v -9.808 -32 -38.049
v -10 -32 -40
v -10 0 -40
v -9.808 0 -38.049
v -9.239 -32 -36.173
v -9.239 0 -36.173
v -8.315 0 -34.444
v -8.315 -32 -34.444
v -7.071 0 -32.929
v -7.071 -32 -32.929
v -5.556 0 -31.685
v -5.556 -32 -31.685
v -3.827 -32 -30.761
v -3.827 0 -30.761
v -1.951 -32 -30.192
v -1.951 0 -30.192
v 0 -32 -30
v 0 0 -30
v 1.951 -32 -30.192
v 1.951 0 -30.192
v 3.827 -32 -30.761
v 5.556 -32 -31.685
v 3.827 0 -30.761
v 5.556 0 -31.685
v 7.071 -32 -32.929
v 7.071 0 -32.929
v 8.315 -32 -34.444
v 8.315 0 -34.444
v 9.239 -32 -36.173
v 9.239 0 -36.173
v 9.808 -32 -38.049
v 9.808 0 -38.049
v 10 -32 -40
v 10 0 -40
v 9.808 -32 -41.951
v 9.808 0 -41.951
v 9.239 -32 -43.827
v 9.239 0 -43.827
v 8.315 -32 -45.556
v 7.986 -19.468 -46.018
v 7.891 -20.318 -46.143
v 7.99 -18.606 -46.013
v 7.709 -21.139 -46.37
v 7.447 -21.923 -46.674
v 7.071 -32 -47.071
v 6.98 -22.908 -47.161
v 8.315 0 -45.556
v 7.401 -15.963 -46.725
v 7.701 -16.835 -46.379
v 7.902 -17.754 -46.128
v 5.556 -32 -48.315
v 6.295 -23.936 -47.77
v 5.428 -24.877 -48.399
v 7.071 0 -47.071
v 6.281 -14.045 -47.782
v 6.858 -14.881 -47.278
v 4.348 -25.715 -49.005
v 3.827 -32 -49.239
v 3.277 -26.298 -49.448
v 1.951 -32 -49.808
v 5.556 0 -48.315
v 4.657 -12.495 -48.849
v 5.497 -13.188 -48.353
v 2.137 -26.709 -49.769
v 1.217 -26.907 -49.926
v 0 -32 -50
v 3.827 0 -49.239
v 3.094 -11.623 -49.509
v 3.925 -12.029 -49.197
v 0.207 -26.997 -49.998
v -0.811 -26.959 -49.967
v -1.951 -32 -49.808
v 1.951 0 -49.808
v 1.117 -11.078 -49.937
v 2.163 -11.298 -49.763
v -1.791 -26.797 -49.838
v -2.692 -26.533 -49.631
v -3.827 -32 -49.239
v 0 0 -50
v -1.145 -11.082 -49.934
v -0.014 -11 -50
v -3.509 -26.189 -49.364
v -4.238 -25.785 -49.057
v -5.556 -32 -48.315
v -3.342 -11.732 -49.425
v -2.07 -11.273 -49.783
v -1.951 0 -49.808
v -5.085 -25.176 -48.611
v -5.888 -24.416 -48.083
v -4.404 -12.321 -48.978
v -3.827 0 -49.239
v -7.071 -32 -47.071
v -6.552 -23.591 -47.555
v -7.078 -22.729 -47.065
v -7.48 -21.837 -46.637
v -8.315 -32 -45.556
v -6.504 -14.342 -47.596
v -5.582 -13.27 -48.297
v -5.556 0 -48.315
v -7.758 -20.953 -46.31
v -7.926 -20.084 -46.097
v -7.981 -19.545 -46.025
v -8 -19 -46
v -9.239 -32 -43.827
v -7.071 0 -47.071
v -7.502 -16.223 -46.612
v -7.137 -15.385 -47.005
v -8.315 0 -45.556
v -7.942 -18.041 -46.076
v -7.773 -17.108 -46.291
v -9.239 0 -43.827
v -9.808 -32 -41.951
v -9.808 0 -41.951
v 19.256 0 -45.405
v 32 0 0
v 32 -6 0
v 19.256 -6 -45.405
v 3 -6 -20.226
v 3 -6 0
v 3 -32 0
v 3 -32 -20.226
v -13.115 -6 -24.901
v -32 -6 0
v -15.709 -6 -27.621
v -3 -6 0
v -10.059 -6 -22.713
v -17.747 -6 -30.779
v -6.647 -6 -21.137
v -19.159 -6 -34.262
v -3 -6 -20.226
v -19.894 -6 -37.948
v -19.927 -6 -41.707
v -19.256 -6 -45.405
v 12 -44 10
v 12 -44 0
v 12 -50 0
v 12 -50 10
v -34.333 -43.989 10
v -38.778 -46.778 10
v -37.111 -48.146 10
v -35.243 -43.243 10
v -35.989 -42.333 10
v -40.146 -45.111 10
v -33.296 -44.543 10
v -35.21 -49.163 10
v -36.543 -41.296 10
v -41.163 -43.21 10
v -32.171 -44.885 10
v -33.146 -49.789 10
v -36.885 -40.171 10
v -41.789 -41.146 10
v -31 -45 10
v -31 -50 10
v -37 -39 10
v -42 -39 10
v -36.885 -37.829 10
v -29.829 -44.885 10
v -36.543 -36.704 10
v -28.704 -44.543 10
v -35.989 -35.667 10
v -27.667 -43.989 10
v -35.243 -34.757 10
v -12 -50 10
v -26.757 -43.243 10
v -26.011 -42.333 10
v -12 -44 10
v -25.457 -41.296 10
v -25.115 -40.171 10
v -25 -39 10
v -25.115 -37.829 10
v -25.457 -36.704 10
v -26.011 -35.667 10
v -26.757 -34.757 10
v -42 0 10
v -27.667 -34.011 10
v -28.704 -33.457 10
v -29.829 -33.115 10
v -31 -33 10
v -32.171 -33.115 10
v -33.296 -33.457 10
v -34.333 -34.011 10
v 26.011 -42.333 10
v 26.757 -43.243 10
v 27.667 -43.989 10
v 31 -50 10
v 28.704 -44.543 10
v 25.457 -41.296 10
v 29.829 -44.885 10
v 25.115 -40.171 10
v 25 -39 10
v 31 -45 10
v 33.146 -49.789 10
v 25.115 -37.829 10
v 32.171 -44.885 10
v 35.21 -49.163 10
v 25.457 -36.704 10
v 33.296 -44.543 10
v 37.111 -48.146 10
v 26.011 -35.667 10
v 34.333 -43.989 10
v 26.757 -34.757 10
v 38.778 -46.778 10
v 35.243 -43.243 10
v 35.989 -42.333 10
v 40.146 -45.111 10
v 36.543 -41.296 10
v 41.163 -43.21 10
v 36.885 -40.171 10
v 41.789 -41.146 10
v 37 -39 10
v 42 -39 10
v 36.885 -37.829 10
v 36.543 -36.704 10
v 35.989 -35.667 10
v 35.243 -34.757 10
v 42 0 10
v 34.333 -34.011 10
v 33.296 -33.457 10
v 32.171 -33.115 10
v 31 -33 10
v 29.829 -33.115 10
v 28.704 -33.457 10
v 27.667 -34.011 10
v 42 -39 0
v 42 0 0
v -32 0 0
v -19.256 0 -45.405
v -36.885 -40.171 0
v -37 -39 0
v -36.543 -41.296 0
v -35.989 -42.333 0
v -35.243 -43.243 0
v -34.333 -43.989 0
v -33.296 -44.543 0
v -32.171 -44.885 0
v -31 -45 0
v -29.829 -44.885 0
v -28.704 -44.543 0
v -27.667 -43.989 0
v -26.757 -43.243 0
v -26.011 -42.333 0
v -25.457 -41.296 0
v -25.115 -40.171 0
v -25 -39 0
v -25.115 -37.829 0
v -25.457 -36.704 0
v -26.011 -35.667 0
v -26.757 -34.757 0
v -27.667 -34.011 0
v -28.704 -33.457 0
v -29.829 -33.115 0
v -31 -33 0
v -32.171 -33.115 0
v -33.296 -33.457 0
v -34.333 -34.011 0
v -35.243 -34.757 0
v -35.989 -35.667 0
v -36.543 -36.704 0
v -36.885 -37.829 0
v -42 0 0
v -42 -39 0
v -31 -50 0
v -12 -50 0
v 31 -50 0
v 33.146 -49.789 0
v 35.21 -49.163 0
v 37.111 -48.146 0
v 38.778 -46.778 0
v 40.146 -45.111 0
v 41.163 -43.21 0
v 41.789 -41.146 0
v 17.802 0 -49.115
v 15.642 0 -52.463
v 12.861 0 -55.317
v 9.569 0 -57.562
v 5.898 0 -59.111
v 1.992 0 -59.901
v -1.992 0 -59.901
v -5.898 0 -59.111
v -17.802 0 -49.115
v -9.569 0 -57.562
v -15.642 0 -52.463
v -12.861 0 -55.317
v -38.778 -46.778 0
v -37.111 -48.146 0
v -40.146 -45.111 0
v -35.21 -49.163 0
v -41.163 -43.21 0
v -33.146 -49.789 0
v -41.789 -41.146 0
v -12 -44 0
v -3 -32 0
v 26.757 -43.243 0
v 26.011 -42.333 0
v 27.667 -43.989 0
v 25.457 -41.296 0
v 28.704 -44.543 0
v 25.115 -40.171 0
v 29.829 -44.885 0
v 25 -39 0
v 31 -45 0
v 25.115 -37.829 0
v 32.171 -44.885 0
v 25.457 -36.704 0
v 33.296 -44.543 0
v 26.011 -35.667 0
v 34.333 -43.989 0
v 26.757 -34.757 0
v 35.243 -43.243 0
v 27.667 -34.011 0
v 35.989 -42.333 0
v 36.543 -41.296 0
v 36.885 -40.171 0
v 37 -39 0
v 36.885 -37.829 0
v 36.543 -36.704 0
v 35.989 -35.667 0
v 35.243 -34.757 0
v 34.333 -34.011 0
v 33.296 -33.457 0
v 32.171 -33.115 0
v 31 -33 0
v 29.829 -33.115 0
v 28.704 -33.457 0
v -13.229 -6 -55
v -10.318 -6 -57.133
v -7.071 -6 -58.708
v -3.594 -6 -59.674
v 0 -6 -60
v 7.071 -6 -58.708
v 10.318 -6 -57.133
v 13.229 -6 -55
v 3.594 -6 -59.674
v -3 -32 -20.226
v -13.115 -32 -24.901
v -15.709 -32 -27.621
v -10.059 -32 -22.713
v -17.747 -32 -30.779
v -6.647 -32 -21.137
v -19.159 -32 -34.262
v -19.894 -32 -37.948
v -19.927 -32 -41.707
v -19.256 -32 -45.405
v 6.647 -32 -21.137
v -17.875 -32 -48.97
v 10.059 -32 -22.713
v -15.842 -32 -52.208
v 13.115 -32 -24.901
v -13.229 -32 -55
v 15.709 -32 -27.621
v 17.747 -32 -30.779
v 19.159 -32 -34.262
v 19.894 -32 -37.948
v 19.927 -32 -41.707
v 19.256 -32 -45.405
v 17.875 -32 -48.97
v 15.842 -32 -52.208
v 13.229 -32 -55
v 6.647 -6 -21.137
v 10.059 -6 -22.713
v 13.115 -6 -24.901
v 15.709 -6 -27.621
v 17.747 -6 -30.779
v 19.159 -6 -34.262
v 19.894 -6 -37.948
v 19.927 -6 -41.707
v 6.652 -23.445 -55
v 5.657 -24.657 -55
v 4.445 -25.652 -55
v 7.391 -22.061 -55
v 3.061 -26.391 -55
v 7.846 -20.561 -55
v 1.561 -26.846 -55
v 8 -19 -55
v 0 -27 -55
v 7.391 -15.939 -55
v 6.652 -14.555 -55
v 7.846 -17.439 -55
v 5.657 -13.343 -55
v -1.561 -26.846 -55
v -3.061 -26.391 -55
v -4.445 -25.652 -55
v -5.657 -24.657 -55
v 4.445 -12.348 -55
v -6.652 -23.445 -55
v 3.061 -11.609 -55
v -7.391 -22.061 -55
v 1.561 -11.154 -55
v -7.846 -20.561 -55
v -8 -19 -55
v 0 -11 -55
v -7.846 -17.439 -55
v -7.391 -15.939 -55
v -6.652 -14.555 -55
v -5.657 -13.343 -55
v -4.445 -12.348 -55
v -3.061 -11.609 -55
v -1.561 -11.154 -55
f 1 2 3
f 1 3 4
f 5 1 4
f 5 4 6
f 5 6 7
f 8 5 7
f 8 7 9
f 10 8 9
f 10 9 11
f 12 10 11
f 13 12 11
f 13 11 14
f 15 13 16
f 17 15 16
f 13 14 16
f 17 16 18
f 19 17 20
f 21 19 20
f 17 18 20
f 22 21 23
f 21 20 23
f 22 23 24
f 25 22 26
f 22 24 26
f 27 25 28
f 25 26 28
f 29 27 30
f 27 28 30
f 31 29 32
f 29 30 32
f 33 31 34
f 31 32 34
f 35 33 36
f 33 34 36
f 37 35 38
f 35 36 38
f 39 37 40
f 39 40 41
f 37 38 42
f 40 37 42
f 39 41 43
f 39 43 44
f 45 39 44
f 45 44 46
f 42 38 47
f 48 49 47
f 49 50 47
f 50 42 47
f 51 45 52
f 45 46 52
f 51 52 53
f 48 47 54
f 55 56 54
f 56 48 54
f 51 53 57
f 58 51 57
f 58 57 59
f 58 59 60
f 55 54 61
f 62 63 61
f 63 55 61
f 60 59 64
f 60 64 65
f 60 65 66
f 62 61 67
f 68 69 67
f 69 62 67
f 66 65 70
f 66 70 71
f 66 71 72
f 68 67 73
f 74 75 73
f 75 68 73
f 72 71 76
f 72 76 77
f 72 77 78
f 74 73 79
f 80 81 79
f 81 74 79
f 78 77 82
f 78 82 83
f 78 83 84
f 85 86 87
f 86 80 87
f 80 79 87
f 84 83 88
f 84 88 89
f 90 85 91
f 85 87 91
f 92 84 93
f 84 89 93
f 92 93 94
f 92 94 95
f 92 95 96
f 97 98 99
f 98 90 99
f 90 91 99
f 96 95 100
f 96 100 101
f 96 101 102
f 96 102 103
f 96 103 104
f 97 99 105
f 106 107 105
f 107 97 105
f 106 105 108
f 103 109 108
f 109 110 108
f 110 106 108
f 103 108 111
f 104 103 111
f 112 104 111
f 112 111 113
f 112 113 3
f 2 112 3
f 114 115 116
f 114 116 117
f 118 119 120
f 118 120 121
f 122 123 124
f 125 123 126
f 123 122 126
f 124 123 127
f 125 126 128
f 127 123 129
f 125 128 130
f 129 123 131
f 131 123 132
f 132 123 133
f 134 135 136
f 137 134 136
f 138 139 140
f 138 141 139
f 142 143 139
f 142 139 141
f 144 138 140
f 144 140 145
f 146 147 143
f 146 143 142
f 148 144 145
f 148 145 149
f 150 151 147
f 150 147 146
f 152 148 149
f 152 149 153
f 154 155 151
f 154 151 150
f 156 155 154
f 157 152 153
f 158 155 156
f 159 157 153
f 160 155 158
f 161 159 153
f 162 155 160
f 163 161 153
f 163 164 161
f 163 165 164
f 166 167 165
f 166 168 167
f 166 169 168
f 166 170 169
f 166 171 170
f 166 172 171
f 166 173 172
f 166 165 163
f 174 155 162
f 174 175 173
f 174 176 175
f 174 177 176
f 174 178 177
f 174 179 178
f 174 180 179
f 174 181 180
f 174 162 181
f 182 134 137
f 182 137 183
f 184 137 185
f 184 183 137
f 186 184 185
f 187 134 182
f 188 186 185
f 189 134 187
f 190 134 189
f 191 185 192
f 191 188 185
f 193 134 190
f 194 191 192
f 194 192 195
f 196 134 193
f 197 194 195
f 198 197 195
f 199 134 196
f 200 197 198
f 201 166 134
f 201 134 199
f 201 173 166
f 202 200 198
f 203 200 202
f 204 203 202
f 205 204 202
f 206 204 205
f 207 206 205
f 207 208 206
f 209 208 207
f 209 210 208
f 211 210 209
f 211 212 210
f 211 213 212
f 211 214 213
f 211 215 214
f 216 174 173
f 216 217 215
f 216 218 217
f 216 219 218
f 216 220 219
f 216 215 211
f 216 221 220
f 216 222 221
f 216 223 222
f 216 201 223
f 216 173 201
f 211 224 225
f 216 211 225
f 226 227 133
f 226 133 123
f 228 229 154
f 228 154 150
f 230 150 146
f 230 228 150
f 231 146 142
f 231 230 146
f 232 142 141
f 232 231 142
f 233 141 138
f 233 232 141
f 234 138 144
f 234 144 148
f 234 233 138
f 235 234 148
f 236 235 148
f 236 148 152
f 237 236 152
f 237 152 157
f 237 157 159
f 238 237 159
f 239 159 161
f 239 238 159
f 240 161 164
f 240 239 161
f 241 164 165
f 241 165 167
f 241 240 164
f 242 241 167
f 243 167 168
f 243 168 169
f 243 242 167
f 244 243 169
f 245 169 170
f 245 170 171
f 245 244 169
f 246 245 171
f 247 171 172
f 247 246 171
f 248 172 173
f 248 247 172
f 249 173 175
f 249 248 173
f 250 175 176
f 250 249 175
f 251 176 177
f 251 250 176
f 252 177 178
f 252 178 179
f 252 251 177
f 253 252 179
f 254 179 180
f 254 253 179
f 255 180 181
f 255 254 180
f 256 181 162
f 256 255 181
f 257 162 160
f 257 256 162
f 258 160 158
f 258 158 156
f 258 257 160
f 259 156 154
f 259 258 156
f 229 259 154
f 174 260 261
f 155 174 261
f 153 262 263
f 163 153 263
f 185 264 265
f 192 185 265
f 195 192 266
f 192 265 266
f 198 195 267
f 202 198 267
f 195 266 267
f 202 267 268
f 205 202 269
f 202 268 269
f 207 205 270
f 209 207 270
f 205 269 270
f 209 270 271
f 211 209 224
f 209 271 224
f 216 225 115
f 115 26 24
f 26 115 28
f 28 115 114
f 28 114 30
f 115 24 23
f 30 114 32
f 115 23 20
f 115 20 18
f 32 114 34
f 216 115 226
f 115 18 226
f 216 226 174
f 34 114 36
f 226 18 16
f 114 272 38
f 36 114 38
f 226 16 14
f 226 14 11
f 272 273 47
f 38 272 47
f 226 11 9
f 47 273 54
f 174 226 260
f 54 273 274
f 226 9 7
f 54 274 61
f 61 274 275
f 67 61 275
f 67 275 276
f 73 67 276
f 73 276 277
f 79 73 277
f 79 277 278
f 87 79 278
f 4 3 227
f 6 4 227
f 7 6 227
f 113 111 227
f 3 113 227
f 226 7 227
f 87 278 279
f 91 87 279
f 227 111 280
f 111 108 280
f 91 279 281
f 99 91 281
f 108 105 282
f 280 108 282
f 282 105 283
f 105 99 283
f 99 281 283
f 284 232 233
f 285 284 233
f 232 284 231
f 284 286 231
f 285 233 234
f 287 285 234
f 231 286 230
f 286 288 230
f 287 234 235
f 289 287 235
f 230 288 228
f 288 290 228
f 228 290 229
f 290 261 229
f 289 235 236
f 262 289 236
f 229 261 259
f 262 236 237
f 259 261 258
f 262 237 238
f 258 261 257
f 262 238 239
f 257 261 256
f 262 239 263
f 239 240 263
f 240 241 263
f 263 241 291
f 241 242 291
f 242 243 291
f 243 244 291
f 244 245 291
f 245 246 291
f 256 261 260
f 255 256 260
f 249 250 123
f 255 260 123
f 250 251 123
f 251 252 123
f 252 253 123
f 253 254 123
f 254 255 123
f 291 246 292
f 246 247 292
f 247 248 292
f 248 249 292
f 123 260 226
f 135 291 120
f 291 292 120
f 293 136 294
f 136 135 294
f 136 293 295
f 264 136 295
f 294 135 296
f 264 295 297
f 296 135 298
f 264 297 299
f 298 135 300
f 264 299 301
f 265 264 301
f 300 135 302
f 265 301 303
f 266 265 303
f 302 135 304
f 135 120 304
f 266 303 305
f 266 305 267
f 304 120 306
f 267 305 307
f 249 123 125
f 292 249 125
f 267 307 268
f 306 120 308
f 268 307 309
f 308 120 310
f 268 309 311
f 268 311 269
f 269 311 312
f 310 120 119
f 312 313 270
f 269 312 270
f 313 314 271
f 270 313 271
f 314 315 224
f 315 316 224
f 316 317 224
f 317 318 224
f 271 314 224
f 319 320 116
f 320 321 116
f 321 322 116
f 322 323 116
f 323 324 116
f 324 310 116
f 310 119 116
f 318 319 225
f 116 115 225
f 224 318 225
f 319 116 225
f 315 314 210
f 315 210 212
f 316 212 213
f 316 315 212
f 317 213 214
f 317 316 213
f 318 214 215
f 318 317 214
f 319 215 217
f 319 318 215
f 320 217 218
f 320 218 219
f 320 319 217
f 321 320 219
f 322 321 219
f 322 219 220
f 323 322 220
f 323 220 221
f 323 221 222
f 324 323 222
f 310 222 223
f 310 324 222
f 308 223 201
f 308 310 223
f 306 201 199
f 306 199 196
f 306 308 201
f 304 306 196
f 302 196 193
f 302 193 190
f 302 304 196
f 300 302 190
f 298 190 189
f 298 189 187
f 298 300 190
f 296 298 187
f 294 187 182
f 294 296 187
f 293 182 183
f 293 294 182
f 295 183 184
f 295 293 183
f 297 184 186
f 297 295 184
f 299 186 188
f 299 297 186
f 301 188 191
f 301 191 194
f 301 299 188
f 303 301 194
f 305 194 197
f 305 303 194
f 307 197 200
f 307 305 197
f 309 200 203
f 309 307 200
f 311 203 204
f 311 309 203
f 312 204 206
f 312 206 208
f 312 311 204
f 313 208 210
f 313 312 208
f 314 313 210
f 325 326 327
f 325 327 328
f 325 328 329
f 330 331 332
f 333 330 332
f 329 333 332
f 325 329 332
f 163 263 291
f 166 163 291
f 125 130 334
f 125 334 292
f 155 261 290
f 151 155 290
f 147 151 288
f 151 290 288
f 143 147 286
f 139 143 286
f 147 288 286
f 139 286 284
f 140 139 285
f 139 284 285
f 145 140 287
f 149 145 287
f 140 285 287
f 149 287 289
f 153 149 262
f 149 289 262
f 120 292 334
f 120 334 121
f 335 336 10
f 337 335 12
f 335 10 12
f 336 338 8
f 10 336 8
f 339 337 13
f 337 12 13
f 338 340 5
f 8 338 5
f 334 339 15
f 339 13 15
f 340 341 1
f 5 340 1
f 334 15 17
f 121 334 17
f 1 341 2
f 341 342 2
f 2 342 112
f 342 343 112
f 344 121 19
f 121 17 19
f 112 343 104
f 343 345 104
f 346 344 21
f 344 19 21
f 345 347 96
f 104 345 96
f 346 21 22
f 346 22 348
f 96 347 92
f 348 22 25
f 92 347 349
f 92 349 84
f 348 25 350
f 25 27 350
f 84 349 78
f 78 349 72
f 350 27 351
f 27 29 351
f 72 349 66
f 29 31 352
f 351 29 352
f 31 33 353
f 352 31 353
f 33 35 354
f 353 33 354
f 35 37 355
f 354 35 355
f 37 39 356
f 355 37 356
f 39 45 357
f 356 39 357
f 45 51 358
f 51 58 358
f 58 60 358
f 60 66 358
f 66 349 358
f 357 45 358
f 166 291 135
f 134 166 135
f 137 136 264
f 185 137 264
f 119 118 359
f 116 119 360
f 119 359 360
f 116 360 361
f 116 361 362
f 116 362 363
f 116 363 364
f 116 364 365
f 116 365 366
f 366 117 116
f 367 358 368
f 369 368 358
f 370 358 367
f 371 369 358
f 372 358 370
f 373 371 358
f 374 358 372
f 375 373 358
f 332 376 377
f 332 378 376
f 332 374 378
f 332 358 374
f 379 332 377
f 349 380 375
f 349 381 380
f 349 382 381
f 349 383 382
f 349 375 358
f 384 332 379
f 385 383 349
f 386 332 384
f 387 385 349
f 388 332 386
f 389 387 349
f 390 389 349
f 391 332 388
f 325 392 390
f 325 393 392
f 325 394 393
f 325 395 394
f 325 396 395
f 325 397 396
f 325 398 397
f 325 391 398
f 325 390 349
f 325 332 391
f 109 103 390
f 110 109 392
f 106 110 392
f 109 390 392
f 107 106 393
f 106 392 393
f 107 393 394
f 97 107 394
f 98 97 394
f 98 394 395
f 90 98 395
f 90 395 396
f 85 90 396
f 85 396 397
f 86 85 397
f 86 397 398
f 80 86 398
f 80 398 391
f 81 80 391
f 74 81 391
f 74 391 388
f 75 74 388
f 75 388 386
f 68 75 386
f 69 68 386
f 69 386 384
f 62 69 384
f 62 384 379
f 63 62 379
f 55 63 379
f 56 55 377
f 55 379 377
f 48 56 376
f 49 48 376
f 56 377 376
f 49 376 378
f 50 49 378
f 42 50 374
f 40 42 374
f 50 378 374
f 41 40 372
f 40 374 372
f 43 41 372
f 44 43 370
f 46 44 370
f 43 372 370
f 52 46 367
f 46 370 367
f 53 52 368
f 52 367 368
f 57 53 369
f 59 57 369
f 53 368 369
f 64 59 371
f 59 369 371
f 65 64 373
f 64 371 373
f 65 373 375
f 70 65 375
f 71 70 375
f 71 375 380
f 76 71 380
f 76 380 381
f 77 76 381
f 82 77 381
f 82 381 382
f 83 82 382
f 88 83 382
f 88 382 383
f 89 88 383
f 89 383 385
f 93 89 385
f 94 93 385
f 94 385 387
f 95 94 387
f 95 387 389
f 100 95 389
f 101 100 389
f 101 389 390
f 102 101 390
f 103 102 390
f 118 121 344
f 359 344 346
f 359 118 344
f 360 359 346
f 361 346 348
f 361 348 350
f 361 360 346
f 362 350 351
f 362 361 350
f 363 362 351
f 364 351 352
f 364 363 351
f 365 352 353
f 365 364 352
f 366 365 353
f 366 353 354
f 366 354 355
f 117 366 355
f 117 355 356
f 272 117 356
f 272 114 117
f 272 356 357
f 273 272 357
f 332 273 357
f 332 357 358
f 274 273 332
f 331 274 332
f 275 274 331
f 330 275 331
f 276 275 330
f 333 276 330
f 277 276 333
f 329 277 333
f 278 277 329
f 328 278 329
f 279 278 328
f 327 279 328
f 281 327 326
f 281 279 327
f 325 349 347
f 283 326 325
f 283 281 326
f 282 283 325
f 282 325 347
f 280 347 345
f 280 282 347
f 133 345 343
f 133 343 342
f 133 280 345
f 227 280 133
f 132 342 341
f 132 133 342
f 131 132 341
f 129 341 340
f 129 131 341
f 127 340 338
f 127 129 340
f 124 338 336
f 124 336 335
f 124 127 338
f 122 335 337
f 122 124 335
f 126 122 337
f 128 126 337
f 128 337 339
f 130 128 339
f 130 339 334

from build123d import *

# Parameters (mm, degrees)
SKETCH_1_R               = 6
EXTRUDE_1_DEPTH          = 10
SKETCH_2_R               = 10
EXTRUDE_2_DEPTH          = 6
SKETCH_2_3_R             = 10
EXTRUDE_3_DEPTH          = 32
CUT_EXTRUDE_1_REACH      = 94.136
CUT_EXTRUDE_1_END_RADIUS = 10
SKETCH_3_R               = 8


with BuildPart() as part:
    # 草图1 → 凸台-拉伸1 (new body)
    with BuildSketch(Plane.XY):
        with BuildLine():
            Line((-31, -50), (-12, -50))
            Line((-12, -50), (-12, -44))
            Line((-12, -44), (12, -44))
            Line((12, -44), (12, -50))
            Line((12, -50), (31, -50))
            ThreePointArc((31, -50), (38.778174593, -46.778174593), (42, -39))
            Line((42, -39), (42, 0))
            Line((42, 0), (-42, 0))
            Line((-42, 0), (-42, -39))
            ThreePointArc((-42, -39), (-38.778174593, -46.778174593), (-31, -50))
        make_face()
        with Locations((31, -39)):
            Circle(SKETCH_1_R, mode=Mode.SUBTRACT)
        with Locations(Location((-31, -39, 0), (0, 0, 180))):
            Circle(SKETCH_1_R, mode=Mode.SUBTRACT)
    extrude(amount=EXTRUDE_1_DEPTH)

    # 草图2 → 凸台-拉伸2 (add)
    with BuildSketch(Plane(origin=(0, 0, 0), x_dir=(1, 0, 0), z_dir=(0, 1, 0))):
        with BuildLine():
            Line((32, 0), (19.255885515, 45.404708412))
            ThreePointArc((19.255885515, 45.404708412), (0, 60), (-19.255885515, 45.404708412))
            Line((-19.255885515, 45.404708412), (-32, 0))
            Line((-32, 0), (32, 0))
        make_face()
        with Locations(Location((0, 40, 0), (0, 0, 180))):
            Circle(SKETCH_2_R, mode=Mode.SUBTRACT)
    extrude(amount=-EXTRUDE_2_DEPTH)

    # 草图2<3> → 凸台-拉伸3 (add)
    with BuildSketch(Plane(origin=(0, 0, 0), x_dir=(1, 0, 0), z_dir=(0, 1, 0))):
        with BuildLine():
            ThreePointArc((3, 20.226280067), (16.802363629, 29.151932131), (19.255885515, 45.404708412))
            ThreePointArc((19.255885515, 45.404708412), (16.936067955, 50.638120239), (13.228756555, 55))
            Line((13.228756555, 55), (-13.228756555, 55))
            ThreePointArc((-13.228756555, 55), (-16.936067955, 50.638120239), (-19.255885515, 45.404708412))
            ThreePointArc((-19.255885515, 45.404708412), (-16.802363629, 29.151932131), (-3, 20.226280067))
            Line((-3, 20.226280067), (-3, 0))
            Line((-3, 0), (3, 0))
            Line((3, 0), (3, 20.226280067))
        make_face()
        with Locations(Location((0, 40, 0), (0, 0, 180))):
            Circle(SKETCH_2_3_R, mode=Mode.SUBTRACT)
    extrude(amount=-EXTRUDE_3_DEPTH)

    # 切除-拉伸1: up to this cylinder (the profile starts outside it)
    cut_extrude_1_end = Plane(origin=(0, -19, -40), z_dir=(0, 1, 0)) * Cylinder(CUT_EXTRUDE_1_END_RADIUS, 209.272, mode=Mode.PRIVATE)
    # 草图3 → 切除-拉伸1 (cut, up to the surface)
    with BuildSketch(Plane(origin=(0, 0, -55), x_dir=(-1, 0, 0), z_dir=(0, 0, -1)), mode=Mode.PRIVATE) as cut_extrude_1_sk1:
        with Locations((0, -19)):
            Circle(SKETCH_3_R)
    cut_extrude_1_tool1 = extrude(cut_extrude_1_sk1.sketch, amount=-CUT_EXTRUDE_1_REACH, mode=Mode.PRIVATE) - cut_extrude_1_end
    add(cut_extrude_1_tool1.solids().sort_by_distance((0, -19, -55))[0], mode=Mode.SUBTRACT)


solid = part.part
